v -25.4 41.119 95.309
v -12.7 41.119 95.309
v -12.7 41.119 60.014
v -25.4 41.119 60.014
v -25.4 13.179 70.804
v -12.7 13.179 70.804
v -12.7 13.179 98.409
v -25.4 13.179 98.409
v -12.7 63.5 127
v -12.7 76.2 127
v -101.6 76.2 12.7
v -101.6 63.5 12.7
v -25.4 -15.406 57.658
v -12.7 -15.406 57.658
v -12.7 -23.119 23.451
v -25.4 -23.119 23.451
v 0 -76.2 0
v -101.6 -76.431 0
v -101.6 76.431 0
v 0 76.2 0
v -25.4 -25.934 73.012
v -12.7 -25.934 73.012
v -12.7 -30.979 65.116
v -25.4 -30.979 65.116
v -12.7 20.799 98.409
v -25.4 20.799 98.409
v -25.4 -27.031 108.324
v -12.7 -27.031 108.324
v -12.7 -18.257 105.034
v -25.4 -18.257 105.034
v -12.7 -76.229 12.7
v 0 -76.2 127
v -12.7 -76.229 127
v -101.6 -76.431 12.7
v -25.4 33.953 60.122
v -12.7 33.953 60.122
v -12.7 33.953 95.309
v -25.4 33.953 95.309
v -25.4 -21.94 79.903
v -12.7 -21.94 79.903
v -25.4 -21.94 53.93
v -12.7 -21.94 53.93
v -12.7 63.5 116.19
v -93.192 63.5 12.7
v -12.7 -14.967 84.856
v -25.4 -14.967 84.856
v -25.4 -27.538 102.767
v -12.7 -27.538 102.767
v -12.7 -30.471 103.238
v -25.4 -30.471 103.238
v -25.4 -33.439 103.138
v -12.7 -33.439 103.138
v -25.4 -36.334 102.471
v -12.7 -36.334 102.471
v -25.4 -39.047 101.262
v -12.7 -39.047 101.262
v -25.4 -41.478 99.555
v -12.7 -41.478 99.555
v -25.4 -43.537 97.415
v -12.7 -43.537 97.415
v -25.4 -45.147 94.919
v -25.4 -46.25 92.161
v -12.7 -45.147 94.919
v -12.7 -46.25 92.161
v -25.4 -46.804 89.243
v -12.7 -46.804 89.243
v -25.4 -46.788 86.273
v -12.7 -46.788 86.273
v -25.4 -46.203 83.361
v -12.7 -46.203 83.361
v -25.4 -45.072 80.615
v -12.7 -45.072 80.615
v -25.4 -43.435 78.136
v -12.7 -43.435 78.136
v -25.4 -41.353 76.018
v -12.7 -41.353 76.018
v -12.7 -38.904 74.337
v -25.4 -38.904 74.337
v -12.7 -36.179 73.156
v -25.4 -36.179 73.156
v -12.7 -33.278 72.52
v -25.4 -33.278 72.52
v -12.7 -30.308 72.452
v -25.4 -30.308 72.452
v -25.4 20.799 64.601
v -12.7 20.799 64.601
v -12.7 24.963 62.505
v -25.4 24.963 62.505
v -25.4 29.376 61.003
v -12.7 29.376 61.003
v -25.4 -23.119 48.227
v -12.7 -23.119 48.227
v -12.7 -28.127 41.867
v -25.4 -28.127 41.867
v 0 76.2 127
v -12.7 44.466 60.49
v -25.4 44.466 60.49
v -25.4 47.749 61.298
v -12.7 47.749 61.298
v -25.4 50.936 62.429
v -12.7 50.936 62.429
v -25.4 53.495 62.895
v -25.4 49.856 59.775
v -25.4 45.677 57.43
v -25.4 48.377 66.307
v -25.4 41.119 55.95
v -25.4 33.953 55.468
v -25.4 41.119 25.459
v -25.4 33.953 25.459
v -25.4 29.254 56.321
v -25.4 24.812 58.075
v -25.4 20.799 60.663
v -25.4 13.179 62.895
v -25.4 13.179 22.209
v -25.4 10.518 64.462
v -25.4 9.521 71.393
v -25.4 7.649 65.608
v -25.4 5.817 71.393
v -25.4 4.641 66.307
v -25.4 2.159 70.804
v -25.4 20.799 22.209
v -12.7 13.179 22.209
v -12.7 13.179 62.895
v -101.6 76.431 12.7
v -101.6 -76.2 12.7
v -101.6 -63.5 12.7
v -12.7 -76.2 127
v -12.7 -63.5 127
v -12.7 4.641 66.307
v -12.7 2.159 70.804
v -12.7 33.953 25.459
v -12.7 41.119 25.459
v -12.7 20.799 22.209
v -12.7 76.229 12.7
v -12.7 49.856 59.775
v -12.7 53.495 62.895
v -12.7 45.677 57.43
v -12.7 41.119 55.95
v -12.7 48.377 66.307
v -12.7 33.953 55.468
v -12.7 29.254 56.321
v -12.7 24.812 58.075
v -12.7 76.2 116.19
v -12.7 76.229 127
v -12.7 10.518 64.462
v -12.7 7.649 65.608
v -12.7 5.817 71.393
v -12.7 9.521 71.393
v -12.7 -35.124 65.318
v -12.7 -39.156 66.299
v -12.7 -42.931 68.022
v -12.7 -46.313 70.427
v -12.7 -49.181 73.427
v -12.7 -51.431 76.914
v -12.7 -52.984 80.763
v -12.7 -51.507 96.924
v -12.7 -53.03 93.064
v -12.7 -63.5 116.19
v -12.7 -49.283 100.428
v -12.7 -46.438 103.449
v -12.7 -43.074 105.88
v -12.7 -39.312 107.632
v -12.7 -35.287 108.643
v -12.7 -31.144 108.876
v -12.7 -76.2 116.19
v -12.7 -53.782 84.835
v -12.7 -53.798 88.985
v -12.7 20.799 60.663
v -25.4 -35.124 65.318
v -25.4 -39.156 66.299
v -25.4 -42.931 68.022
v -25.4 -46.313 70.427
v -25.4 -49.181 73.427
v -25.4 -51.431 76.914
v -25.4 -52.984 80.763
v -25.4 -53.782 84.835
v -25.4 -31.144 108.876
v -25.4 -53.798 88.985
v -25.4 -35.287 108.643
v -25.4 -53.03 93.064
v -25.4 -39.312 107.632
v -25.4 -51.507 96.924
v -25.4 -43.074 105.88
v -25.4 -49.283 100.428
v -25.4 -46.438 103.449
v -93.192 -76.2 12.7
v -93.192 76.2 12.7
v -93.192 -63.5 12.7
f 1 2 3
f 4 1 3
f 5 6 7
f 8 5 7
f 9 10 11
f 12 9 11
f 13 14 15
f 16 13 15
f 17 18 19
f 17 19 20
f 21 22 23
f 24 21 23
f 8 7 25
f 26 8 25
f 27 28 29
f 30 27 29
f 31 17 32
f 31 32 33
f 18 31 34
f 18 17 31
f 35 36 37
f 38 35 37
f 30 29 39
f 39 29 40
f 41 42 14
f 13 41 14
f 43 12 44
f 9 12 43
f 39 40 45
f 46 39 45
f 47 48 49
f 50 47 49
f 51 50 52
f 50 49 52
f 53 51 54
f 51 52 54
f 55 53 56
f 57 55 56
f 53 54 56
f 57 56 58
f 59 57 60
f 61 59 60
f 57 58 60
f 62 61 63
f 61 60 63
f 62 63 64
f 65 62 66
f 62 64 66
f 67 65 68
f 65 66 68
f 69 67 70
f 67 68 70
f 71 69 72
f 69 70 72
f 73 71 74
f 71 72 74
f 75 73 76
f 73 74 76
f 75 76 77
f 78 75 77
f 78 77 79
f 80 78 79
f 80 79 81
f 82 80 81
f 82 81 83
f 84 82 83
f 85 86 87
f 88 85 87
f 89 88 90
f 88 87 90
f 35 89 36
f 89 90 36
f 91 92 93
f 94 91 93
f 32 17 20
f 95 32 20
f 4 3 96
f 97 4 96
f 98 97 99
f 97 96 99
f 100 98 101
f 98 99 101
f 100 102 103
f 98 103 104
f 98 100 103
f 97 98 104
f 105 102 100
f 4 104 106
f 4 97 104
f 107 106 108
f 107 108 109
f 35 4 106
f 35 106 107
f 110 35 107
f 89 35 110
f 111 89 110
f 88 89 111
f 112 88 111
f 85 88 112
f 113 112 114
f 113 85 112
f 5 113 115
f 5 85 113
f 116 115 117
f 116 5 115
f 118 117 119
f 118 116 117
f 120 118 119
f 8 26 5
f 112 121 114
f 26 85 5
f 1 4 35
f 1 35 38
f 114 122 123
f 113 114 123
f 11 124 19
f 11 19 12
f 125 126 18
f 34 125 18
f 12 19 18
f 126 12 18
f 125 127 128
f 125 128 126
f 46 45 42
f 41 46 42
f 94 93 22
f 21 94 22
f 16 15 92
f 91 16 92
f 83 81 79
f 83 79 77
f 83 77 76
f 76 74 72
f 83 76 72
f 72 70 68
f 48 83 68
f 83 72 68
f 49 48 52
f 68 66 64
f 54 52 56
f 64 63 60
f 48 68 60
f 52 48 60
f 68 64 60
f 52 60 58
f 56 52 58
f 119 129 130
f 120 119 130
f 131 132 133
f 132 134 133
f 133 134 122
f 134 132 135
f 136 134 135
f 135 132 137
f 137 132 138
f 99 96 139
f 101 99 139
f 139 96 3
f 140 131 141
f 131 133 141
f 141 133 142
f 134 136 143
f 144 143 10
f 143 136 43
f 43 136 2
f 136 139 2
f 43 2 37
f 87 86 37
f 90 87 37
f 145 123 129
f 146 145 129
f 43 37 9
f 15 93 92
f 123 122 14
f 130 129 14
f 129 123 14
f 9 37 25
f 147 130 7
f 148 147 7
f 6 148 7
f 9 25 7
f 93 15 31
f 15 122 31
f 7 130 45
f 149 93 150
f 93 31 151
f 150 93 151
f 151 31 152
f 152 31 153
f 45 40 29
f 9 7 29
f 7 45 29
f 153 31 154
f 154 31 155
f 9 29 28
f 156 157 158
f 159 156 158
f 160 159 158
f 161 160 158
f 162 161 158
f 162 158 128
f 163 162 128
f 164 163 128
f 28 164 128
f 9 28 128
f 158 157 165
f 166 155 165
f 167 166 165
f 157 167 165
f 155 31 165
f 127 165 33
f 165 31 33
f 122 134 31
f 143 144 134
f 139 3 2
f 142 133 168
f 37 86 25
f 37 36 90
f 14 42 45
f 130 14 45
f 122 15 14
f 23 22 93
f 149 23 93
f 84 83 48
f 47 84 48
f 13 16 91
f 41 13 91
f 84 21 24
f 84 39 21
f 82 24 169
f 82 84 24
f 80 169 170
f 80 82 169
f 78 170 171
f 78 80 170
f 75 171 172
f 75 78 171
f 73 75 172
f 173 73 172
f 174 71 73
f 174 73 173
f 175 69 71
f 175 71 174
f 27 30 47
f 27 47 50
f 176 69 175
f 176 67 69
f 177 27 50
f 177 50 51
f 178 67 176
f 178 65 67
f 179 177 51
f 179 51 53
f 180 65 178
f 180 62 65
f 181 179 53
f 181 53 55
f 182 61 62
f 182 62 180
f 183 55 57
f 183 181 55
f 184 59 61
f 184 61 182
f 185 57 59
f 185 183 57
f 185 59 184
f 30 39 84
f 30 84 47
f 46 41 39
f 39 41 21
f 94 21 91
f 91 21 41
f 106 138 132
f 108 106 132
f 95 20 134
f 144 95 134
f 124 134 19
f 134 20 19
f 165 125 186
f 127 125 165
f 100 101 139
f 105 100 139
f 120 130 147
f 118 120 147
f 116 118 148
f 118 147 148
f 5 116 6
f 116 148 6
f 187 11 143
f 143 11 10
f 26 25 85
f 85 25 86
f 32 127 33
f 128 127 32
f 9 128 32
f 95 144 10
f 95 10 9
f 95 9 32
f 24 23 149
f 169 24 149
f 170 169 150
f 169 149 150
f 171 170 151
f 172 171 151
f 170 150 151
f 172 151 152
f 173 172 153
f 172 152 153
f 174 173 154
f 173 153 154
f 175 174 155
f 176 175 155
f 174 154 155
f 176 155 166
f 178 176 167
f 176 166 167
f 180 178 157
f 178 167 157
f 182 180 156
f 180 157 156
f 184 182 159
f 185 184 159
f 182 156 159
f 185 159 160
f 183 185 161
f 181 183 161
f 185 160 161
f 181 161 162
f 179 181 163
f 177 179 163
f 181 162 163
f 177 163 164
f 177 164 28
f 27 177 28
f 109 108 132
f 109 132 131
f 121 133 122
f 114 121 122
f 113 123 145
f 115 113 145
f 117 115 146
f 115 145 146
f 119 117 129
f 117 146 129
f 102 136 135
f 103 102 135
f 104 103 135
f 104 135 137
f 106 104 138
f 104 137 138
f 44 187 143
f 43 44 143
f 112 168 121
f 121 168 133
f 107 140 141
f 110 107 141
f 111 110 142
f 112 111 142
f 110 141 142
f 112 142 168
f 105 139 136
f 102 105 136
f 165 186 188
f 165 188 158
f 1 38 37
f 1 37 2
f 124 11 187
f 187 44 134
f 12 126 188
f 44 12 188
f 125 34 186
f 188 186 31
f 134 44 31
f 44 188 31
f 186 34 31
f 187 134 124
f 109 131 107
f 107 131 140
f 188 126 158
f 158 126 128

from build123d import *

# Parameters (mm, degrees)
F1_DEPTH  = 127
F2_W      = 88.9
F2_H      = 114.3
F3_DEPTH  = 152.6319465885
F5_DEPTH  = 12.7
F9_DEPTH  = 12.7
F10_DEPTH = 12.7


with BuildPart() as f1:
    # F0 (on Top) → F1 (new body)
    with BuildSketch(Plane.XY):
        Polygon((0, -76.2), (0, 0), (0, 76.2), (-101.6, 76.4309465885), (-101.6, -76.2), align=None)
    extrude(amount=F1_DEPTH)

    # F2 (on face) → F3 (cut, through all)
    with BuildSketch(Plane.XZ.offset(76.2)):
        with Locations((-57.15, 69.85)):
            Rectangle(F2_W, F2_H)
    extrude(amount=-F3_DEPTH, mode=Mode.SUBTRACT)

    # F4 (on face) → F5 (join)
    with BuildSketch(Plane.XZ.offset(76.2)):
        Polygon((-12.7, 127), (-101.6, 12.7), (-93.1919366121, 12.7), (-12.7, 116.189632787), align=None)
    extrude(amount=-F5_DEPTH)

    # F6: F1 across plane


with BuildPart() as f1_1:
    add(f1.part)
    add(f1.part.mirror(Plane.XZ))

    # F8 (on face) → F9 (join)
    with BuildSketch(Plane(origin=(-12.7, 0, 0), x_dir=(0, -1, 0), z_dir=(-1, 0, 0))):
        Polygon((27.0305331796, 108.3241701126), (18.2572510093, 105.0341874361), (21.9403224368, 79.9026338657), (14.9672674015, 84.8556309938), (21.9403224368, 53.9298020303), (15.4059324414, 57.6584488153), (23.1189505014, 23.4508488309), (23.1189505014, 48.2271686196), (28.1271934509, 41.8665371835), (25.9338729084, 73.0116963387), (30.9785138816, 65.1157423854), (30.3082256371, 72.4516701299), (27.5382939124, 102.7670145489), align=None)
        with BuildLine():
            ThreePointArc((30.9785138816, 65.1157423854), (53.7975454705, 88.9853099615), (27.0305331796, 108.3241701126))
            Line((27.0305331796, 108.3241701126), (27.5382939124, 102.7670145489))
            ThreePointArc((27.5382939124, 102.7670145489), (46.803503681, 89.2430712576), (30.3082256371, 72.4516701299))
            Line((30.3082256371, 72.4516701299), (30.9785138816, 65.1157423854))
        make_face()
    extrude(amount=F9_DEPTH)

    # F7 (on face) → F10 (join)
    with BuildSketch(Plane(origin=(-12.7, 0, 0), x_dir=(0, -1, 0), z_dir=(-1, 0, 0))):
        with BuildLine():
            Line((-41.1189049482, 55.9498922817), (-41.1189049482, 60.0139613671))
            ThreePointArc((-41.1189049482, 60.0139613671), (-46.1180179766, 60.8526580466), (-50.9355384856, 62.4293759465))
            Line((-50.9355384856, 62.4293759465), (-48.3765341341, 66.3066580892))
            Line((-48.3765341341, 66.3066580892), (-53.4945428371, 62.8946498036))
            ThreePointArc((-53.4945428371, 62.8946498036), (-47.8245334602, 58.4995284296), (-41.1189049482, 55.9498922817))
        make_face()
        with BuildLine():
            Line((-33.9530482888, 95.3087136149), (-41.1189049482, 95.3087136149))
            Line((-41.1189049482, 95.3087136149), (-41.1189049482, 60.0139613671))
            ThreePointArc((-41.1189049482, 60.0139613671), (-37.5331179531, 59.8773300828), (-33.9530482888, 60.1215383586))
            Line((-33.9530482888, 60.1215383586), (-33.9530482888, 60.6629624963))
            Line((-33.9530482888, 60.6629624963), (-33.9530482888, 95.3087136149))
        make_face()
        with BuildLine():
            ThreePointArc((-33.9530482888, 55.4682547852), (-37.5538538559, 55.4430939924), (-41.1189049482, 55.9498922817))
            Line((-41.1189049482, 55.9498922817), (-41.1189049482, 25.4587136149))
            Line((-41.1189049482, 25.4587136149), (-33.9530482888, 25.4587136149))
            Line((-33.9530482888, 25.4587136149), (-33.9530482888, 55.4682547852))
        make_face()
        with BuildLine():
            ThreePointArc((-33.9530482888, 60.1215383586), (-37.5331179531, 59.8773300828), (-41.1189049482, 60.0139613671))
            Line((-41.1189049482, 60.0139613671), (-41.1189049482, 55.9498922817))
            ThreePointArc((-41.1189049482, 55.9498922817), (-37.5538538559, 55.4430939924), (-33.9530482888, 55.4682547852))
            Line((-33.9530482888, 55.4682547852), (-33.9530482888, 60.1215383586))
        make_face()
        with BuildLine():
            ThreePointArc((-20.7989049482, 64.6006539464), (-27.1433610579, 61.6779571784), (-33.9530482888, 60.1215383586))
            Line((-33.9530482888, 60.1215383586), (-33.9530482888, 55.4682547852))
            ThreePointArc((-33.9530482888, 55.4682547852), (-26.9900318901, 57.0883116374), (-20.7989049482, 60.6629624963))
            Line((-20.7989049482, 60.6629624963), (-20.7989049482, 64.6006539464))
        make_face()
        Polygon((-20.7989049482, 98.4088753533), (-20.7989049482, 64.6006539464), (-20.7989049482, 60.6629624963), (-20.7989049482, 22.2088753533), (-13.1789049482, 22.2088753533), (-13.1789049482, 62.8946498036), (-13.1789049482, 70.8043053746), (-13.1789049482, 98.4088753533), align=None)
        with BuildLine():
            ThreePointArc((-2.1593503188, 70.8043053746), (-7.6691276335, 71.4665793512), (-13.1789049482, 70.8043053746))
            Line((-13.1789049482, 70.8043053746), (-13.1789049482, 62.8946498036))
            ThreePointArc((-13.1789049482, 62.8946498036), (-9.105292791, 65.0897069065), (-4.640808329, 66.3066580892))
            Line((-4.640808329, 66.3066580892), (-2.1593503188, 70.8043053746))
        make_face()
    extrude(amount=F10_DEPTH)


solid = f1_1.part
